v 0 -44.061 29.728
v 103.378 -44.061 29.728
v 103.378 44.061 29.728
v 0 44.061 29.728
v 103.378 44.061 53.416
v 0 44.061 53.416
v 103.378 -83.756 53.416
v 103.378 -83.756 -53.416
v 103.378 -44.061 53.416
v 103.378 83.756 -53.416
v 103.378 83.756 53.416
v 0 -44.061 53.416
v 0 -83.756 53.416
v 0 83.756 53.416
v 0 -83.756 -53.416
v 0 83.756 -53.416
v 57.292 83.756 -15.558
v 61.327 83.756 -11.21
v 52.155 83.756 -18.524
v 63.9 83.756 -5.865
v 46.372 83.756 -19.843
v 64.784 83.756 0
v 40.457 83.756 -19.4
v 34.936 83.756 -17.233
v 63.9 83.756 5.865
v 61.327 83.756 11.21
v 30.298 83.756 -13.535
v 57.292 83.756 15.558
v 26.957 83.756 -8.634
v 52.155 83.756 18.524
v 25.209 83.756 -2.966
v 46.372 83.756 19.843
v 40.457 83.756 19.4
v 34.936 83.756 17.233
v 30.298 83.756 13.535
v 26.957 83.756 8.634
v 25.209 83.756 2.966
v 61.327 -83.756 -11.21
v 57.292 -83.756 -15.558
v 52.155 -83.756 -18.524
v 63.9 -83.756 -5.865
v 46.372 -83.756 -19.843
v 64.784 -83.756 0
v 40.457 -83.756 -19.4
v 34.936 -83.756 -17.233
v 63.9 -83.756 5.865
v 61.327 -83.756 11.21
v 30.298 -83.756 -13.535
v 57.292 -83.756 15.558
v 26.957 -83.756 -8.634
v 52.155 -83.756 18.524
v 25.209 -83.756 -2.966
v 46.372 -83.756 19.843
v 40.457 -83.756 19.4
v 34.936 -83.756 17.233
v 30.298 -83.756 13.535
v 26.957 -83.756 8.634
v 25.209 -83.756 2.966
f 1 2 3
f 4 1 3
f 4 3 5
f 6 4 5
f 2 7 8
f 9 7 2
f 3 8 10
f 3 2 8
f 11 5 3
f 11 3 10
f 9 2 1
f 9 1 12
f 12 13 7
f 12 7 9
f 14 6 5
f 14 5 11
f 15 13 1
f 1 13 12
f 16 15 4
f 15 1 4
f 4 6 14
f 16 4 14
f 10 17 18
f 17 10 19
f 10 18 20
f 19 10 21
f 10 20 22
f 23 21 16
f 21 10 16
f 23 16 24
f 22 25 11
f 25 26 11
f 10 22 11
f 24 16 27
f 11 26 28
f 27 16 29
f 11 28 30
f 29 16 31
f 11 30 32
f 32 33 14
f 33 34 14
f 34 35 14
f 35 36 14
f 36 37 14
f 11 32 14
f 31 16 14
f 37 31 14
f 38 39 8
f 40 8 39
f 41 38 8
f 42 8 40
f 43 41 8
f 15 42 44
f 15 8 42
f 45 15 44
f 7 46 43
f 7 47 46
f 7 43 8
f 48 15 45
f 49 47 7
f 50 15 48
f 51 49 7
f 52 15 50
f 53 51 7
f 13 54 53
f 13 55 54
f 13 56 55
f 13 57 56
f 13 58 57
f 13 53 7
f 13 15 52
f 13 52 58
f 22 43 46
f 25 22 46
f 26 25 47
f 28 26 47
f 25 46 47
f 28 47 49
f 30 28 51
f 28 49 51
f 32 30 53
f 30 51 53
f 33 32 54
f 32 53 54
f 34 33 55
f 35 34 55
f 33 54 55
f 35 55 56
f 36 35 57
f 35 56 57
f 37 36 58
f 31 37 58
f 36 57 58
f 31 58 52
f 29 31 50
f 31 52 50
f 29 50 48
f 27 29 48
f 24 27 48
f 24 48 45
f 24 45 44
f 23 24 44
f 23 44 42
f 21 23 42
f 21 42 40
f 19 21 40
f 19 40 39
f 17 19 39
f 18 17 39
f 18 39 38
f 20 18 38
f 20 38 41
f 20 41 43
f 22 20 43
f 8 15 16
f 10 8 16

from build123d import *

# Parameters (mm, degrees)
F0_W     = 167.511746
F0_H     = 106.832422
F1_DEPTH = 103.378
F2_R     = 19.899067
F3_DEPTH = 229.362
F4_W     = 88.121988
F4_H     = 47.376074
F5_DEPTH = 133.096


with BuildPart() as f1:
    # F0 (on Right) → F1 (new body)
    with BuildSketch(Plane.YZ):
        Rectangle(F0_W, F0_H)
    extrude(amount=F1_DEPTH)

    # F2 (on face) → F3 (cut)
    with BuildSketch(Plane.XZ.offset(83.755873)):
        with Locations((44.885427, 0)):
            Circle(F2_R)
    extrude(amount=-F3_DEPTH, mode=Mode.SUBTRACT)

    # F4 (on face) → F5 (cut)
    with BuildSketch(Plane.YZ.offset(103.378)):
        with Locations((0, 53.416211)):
            Rectangle(F4_W, F4_H)
    extrude(amount=-F5_DEPTH, mode=Mode.SUBTRACT)


solid = f1.part
